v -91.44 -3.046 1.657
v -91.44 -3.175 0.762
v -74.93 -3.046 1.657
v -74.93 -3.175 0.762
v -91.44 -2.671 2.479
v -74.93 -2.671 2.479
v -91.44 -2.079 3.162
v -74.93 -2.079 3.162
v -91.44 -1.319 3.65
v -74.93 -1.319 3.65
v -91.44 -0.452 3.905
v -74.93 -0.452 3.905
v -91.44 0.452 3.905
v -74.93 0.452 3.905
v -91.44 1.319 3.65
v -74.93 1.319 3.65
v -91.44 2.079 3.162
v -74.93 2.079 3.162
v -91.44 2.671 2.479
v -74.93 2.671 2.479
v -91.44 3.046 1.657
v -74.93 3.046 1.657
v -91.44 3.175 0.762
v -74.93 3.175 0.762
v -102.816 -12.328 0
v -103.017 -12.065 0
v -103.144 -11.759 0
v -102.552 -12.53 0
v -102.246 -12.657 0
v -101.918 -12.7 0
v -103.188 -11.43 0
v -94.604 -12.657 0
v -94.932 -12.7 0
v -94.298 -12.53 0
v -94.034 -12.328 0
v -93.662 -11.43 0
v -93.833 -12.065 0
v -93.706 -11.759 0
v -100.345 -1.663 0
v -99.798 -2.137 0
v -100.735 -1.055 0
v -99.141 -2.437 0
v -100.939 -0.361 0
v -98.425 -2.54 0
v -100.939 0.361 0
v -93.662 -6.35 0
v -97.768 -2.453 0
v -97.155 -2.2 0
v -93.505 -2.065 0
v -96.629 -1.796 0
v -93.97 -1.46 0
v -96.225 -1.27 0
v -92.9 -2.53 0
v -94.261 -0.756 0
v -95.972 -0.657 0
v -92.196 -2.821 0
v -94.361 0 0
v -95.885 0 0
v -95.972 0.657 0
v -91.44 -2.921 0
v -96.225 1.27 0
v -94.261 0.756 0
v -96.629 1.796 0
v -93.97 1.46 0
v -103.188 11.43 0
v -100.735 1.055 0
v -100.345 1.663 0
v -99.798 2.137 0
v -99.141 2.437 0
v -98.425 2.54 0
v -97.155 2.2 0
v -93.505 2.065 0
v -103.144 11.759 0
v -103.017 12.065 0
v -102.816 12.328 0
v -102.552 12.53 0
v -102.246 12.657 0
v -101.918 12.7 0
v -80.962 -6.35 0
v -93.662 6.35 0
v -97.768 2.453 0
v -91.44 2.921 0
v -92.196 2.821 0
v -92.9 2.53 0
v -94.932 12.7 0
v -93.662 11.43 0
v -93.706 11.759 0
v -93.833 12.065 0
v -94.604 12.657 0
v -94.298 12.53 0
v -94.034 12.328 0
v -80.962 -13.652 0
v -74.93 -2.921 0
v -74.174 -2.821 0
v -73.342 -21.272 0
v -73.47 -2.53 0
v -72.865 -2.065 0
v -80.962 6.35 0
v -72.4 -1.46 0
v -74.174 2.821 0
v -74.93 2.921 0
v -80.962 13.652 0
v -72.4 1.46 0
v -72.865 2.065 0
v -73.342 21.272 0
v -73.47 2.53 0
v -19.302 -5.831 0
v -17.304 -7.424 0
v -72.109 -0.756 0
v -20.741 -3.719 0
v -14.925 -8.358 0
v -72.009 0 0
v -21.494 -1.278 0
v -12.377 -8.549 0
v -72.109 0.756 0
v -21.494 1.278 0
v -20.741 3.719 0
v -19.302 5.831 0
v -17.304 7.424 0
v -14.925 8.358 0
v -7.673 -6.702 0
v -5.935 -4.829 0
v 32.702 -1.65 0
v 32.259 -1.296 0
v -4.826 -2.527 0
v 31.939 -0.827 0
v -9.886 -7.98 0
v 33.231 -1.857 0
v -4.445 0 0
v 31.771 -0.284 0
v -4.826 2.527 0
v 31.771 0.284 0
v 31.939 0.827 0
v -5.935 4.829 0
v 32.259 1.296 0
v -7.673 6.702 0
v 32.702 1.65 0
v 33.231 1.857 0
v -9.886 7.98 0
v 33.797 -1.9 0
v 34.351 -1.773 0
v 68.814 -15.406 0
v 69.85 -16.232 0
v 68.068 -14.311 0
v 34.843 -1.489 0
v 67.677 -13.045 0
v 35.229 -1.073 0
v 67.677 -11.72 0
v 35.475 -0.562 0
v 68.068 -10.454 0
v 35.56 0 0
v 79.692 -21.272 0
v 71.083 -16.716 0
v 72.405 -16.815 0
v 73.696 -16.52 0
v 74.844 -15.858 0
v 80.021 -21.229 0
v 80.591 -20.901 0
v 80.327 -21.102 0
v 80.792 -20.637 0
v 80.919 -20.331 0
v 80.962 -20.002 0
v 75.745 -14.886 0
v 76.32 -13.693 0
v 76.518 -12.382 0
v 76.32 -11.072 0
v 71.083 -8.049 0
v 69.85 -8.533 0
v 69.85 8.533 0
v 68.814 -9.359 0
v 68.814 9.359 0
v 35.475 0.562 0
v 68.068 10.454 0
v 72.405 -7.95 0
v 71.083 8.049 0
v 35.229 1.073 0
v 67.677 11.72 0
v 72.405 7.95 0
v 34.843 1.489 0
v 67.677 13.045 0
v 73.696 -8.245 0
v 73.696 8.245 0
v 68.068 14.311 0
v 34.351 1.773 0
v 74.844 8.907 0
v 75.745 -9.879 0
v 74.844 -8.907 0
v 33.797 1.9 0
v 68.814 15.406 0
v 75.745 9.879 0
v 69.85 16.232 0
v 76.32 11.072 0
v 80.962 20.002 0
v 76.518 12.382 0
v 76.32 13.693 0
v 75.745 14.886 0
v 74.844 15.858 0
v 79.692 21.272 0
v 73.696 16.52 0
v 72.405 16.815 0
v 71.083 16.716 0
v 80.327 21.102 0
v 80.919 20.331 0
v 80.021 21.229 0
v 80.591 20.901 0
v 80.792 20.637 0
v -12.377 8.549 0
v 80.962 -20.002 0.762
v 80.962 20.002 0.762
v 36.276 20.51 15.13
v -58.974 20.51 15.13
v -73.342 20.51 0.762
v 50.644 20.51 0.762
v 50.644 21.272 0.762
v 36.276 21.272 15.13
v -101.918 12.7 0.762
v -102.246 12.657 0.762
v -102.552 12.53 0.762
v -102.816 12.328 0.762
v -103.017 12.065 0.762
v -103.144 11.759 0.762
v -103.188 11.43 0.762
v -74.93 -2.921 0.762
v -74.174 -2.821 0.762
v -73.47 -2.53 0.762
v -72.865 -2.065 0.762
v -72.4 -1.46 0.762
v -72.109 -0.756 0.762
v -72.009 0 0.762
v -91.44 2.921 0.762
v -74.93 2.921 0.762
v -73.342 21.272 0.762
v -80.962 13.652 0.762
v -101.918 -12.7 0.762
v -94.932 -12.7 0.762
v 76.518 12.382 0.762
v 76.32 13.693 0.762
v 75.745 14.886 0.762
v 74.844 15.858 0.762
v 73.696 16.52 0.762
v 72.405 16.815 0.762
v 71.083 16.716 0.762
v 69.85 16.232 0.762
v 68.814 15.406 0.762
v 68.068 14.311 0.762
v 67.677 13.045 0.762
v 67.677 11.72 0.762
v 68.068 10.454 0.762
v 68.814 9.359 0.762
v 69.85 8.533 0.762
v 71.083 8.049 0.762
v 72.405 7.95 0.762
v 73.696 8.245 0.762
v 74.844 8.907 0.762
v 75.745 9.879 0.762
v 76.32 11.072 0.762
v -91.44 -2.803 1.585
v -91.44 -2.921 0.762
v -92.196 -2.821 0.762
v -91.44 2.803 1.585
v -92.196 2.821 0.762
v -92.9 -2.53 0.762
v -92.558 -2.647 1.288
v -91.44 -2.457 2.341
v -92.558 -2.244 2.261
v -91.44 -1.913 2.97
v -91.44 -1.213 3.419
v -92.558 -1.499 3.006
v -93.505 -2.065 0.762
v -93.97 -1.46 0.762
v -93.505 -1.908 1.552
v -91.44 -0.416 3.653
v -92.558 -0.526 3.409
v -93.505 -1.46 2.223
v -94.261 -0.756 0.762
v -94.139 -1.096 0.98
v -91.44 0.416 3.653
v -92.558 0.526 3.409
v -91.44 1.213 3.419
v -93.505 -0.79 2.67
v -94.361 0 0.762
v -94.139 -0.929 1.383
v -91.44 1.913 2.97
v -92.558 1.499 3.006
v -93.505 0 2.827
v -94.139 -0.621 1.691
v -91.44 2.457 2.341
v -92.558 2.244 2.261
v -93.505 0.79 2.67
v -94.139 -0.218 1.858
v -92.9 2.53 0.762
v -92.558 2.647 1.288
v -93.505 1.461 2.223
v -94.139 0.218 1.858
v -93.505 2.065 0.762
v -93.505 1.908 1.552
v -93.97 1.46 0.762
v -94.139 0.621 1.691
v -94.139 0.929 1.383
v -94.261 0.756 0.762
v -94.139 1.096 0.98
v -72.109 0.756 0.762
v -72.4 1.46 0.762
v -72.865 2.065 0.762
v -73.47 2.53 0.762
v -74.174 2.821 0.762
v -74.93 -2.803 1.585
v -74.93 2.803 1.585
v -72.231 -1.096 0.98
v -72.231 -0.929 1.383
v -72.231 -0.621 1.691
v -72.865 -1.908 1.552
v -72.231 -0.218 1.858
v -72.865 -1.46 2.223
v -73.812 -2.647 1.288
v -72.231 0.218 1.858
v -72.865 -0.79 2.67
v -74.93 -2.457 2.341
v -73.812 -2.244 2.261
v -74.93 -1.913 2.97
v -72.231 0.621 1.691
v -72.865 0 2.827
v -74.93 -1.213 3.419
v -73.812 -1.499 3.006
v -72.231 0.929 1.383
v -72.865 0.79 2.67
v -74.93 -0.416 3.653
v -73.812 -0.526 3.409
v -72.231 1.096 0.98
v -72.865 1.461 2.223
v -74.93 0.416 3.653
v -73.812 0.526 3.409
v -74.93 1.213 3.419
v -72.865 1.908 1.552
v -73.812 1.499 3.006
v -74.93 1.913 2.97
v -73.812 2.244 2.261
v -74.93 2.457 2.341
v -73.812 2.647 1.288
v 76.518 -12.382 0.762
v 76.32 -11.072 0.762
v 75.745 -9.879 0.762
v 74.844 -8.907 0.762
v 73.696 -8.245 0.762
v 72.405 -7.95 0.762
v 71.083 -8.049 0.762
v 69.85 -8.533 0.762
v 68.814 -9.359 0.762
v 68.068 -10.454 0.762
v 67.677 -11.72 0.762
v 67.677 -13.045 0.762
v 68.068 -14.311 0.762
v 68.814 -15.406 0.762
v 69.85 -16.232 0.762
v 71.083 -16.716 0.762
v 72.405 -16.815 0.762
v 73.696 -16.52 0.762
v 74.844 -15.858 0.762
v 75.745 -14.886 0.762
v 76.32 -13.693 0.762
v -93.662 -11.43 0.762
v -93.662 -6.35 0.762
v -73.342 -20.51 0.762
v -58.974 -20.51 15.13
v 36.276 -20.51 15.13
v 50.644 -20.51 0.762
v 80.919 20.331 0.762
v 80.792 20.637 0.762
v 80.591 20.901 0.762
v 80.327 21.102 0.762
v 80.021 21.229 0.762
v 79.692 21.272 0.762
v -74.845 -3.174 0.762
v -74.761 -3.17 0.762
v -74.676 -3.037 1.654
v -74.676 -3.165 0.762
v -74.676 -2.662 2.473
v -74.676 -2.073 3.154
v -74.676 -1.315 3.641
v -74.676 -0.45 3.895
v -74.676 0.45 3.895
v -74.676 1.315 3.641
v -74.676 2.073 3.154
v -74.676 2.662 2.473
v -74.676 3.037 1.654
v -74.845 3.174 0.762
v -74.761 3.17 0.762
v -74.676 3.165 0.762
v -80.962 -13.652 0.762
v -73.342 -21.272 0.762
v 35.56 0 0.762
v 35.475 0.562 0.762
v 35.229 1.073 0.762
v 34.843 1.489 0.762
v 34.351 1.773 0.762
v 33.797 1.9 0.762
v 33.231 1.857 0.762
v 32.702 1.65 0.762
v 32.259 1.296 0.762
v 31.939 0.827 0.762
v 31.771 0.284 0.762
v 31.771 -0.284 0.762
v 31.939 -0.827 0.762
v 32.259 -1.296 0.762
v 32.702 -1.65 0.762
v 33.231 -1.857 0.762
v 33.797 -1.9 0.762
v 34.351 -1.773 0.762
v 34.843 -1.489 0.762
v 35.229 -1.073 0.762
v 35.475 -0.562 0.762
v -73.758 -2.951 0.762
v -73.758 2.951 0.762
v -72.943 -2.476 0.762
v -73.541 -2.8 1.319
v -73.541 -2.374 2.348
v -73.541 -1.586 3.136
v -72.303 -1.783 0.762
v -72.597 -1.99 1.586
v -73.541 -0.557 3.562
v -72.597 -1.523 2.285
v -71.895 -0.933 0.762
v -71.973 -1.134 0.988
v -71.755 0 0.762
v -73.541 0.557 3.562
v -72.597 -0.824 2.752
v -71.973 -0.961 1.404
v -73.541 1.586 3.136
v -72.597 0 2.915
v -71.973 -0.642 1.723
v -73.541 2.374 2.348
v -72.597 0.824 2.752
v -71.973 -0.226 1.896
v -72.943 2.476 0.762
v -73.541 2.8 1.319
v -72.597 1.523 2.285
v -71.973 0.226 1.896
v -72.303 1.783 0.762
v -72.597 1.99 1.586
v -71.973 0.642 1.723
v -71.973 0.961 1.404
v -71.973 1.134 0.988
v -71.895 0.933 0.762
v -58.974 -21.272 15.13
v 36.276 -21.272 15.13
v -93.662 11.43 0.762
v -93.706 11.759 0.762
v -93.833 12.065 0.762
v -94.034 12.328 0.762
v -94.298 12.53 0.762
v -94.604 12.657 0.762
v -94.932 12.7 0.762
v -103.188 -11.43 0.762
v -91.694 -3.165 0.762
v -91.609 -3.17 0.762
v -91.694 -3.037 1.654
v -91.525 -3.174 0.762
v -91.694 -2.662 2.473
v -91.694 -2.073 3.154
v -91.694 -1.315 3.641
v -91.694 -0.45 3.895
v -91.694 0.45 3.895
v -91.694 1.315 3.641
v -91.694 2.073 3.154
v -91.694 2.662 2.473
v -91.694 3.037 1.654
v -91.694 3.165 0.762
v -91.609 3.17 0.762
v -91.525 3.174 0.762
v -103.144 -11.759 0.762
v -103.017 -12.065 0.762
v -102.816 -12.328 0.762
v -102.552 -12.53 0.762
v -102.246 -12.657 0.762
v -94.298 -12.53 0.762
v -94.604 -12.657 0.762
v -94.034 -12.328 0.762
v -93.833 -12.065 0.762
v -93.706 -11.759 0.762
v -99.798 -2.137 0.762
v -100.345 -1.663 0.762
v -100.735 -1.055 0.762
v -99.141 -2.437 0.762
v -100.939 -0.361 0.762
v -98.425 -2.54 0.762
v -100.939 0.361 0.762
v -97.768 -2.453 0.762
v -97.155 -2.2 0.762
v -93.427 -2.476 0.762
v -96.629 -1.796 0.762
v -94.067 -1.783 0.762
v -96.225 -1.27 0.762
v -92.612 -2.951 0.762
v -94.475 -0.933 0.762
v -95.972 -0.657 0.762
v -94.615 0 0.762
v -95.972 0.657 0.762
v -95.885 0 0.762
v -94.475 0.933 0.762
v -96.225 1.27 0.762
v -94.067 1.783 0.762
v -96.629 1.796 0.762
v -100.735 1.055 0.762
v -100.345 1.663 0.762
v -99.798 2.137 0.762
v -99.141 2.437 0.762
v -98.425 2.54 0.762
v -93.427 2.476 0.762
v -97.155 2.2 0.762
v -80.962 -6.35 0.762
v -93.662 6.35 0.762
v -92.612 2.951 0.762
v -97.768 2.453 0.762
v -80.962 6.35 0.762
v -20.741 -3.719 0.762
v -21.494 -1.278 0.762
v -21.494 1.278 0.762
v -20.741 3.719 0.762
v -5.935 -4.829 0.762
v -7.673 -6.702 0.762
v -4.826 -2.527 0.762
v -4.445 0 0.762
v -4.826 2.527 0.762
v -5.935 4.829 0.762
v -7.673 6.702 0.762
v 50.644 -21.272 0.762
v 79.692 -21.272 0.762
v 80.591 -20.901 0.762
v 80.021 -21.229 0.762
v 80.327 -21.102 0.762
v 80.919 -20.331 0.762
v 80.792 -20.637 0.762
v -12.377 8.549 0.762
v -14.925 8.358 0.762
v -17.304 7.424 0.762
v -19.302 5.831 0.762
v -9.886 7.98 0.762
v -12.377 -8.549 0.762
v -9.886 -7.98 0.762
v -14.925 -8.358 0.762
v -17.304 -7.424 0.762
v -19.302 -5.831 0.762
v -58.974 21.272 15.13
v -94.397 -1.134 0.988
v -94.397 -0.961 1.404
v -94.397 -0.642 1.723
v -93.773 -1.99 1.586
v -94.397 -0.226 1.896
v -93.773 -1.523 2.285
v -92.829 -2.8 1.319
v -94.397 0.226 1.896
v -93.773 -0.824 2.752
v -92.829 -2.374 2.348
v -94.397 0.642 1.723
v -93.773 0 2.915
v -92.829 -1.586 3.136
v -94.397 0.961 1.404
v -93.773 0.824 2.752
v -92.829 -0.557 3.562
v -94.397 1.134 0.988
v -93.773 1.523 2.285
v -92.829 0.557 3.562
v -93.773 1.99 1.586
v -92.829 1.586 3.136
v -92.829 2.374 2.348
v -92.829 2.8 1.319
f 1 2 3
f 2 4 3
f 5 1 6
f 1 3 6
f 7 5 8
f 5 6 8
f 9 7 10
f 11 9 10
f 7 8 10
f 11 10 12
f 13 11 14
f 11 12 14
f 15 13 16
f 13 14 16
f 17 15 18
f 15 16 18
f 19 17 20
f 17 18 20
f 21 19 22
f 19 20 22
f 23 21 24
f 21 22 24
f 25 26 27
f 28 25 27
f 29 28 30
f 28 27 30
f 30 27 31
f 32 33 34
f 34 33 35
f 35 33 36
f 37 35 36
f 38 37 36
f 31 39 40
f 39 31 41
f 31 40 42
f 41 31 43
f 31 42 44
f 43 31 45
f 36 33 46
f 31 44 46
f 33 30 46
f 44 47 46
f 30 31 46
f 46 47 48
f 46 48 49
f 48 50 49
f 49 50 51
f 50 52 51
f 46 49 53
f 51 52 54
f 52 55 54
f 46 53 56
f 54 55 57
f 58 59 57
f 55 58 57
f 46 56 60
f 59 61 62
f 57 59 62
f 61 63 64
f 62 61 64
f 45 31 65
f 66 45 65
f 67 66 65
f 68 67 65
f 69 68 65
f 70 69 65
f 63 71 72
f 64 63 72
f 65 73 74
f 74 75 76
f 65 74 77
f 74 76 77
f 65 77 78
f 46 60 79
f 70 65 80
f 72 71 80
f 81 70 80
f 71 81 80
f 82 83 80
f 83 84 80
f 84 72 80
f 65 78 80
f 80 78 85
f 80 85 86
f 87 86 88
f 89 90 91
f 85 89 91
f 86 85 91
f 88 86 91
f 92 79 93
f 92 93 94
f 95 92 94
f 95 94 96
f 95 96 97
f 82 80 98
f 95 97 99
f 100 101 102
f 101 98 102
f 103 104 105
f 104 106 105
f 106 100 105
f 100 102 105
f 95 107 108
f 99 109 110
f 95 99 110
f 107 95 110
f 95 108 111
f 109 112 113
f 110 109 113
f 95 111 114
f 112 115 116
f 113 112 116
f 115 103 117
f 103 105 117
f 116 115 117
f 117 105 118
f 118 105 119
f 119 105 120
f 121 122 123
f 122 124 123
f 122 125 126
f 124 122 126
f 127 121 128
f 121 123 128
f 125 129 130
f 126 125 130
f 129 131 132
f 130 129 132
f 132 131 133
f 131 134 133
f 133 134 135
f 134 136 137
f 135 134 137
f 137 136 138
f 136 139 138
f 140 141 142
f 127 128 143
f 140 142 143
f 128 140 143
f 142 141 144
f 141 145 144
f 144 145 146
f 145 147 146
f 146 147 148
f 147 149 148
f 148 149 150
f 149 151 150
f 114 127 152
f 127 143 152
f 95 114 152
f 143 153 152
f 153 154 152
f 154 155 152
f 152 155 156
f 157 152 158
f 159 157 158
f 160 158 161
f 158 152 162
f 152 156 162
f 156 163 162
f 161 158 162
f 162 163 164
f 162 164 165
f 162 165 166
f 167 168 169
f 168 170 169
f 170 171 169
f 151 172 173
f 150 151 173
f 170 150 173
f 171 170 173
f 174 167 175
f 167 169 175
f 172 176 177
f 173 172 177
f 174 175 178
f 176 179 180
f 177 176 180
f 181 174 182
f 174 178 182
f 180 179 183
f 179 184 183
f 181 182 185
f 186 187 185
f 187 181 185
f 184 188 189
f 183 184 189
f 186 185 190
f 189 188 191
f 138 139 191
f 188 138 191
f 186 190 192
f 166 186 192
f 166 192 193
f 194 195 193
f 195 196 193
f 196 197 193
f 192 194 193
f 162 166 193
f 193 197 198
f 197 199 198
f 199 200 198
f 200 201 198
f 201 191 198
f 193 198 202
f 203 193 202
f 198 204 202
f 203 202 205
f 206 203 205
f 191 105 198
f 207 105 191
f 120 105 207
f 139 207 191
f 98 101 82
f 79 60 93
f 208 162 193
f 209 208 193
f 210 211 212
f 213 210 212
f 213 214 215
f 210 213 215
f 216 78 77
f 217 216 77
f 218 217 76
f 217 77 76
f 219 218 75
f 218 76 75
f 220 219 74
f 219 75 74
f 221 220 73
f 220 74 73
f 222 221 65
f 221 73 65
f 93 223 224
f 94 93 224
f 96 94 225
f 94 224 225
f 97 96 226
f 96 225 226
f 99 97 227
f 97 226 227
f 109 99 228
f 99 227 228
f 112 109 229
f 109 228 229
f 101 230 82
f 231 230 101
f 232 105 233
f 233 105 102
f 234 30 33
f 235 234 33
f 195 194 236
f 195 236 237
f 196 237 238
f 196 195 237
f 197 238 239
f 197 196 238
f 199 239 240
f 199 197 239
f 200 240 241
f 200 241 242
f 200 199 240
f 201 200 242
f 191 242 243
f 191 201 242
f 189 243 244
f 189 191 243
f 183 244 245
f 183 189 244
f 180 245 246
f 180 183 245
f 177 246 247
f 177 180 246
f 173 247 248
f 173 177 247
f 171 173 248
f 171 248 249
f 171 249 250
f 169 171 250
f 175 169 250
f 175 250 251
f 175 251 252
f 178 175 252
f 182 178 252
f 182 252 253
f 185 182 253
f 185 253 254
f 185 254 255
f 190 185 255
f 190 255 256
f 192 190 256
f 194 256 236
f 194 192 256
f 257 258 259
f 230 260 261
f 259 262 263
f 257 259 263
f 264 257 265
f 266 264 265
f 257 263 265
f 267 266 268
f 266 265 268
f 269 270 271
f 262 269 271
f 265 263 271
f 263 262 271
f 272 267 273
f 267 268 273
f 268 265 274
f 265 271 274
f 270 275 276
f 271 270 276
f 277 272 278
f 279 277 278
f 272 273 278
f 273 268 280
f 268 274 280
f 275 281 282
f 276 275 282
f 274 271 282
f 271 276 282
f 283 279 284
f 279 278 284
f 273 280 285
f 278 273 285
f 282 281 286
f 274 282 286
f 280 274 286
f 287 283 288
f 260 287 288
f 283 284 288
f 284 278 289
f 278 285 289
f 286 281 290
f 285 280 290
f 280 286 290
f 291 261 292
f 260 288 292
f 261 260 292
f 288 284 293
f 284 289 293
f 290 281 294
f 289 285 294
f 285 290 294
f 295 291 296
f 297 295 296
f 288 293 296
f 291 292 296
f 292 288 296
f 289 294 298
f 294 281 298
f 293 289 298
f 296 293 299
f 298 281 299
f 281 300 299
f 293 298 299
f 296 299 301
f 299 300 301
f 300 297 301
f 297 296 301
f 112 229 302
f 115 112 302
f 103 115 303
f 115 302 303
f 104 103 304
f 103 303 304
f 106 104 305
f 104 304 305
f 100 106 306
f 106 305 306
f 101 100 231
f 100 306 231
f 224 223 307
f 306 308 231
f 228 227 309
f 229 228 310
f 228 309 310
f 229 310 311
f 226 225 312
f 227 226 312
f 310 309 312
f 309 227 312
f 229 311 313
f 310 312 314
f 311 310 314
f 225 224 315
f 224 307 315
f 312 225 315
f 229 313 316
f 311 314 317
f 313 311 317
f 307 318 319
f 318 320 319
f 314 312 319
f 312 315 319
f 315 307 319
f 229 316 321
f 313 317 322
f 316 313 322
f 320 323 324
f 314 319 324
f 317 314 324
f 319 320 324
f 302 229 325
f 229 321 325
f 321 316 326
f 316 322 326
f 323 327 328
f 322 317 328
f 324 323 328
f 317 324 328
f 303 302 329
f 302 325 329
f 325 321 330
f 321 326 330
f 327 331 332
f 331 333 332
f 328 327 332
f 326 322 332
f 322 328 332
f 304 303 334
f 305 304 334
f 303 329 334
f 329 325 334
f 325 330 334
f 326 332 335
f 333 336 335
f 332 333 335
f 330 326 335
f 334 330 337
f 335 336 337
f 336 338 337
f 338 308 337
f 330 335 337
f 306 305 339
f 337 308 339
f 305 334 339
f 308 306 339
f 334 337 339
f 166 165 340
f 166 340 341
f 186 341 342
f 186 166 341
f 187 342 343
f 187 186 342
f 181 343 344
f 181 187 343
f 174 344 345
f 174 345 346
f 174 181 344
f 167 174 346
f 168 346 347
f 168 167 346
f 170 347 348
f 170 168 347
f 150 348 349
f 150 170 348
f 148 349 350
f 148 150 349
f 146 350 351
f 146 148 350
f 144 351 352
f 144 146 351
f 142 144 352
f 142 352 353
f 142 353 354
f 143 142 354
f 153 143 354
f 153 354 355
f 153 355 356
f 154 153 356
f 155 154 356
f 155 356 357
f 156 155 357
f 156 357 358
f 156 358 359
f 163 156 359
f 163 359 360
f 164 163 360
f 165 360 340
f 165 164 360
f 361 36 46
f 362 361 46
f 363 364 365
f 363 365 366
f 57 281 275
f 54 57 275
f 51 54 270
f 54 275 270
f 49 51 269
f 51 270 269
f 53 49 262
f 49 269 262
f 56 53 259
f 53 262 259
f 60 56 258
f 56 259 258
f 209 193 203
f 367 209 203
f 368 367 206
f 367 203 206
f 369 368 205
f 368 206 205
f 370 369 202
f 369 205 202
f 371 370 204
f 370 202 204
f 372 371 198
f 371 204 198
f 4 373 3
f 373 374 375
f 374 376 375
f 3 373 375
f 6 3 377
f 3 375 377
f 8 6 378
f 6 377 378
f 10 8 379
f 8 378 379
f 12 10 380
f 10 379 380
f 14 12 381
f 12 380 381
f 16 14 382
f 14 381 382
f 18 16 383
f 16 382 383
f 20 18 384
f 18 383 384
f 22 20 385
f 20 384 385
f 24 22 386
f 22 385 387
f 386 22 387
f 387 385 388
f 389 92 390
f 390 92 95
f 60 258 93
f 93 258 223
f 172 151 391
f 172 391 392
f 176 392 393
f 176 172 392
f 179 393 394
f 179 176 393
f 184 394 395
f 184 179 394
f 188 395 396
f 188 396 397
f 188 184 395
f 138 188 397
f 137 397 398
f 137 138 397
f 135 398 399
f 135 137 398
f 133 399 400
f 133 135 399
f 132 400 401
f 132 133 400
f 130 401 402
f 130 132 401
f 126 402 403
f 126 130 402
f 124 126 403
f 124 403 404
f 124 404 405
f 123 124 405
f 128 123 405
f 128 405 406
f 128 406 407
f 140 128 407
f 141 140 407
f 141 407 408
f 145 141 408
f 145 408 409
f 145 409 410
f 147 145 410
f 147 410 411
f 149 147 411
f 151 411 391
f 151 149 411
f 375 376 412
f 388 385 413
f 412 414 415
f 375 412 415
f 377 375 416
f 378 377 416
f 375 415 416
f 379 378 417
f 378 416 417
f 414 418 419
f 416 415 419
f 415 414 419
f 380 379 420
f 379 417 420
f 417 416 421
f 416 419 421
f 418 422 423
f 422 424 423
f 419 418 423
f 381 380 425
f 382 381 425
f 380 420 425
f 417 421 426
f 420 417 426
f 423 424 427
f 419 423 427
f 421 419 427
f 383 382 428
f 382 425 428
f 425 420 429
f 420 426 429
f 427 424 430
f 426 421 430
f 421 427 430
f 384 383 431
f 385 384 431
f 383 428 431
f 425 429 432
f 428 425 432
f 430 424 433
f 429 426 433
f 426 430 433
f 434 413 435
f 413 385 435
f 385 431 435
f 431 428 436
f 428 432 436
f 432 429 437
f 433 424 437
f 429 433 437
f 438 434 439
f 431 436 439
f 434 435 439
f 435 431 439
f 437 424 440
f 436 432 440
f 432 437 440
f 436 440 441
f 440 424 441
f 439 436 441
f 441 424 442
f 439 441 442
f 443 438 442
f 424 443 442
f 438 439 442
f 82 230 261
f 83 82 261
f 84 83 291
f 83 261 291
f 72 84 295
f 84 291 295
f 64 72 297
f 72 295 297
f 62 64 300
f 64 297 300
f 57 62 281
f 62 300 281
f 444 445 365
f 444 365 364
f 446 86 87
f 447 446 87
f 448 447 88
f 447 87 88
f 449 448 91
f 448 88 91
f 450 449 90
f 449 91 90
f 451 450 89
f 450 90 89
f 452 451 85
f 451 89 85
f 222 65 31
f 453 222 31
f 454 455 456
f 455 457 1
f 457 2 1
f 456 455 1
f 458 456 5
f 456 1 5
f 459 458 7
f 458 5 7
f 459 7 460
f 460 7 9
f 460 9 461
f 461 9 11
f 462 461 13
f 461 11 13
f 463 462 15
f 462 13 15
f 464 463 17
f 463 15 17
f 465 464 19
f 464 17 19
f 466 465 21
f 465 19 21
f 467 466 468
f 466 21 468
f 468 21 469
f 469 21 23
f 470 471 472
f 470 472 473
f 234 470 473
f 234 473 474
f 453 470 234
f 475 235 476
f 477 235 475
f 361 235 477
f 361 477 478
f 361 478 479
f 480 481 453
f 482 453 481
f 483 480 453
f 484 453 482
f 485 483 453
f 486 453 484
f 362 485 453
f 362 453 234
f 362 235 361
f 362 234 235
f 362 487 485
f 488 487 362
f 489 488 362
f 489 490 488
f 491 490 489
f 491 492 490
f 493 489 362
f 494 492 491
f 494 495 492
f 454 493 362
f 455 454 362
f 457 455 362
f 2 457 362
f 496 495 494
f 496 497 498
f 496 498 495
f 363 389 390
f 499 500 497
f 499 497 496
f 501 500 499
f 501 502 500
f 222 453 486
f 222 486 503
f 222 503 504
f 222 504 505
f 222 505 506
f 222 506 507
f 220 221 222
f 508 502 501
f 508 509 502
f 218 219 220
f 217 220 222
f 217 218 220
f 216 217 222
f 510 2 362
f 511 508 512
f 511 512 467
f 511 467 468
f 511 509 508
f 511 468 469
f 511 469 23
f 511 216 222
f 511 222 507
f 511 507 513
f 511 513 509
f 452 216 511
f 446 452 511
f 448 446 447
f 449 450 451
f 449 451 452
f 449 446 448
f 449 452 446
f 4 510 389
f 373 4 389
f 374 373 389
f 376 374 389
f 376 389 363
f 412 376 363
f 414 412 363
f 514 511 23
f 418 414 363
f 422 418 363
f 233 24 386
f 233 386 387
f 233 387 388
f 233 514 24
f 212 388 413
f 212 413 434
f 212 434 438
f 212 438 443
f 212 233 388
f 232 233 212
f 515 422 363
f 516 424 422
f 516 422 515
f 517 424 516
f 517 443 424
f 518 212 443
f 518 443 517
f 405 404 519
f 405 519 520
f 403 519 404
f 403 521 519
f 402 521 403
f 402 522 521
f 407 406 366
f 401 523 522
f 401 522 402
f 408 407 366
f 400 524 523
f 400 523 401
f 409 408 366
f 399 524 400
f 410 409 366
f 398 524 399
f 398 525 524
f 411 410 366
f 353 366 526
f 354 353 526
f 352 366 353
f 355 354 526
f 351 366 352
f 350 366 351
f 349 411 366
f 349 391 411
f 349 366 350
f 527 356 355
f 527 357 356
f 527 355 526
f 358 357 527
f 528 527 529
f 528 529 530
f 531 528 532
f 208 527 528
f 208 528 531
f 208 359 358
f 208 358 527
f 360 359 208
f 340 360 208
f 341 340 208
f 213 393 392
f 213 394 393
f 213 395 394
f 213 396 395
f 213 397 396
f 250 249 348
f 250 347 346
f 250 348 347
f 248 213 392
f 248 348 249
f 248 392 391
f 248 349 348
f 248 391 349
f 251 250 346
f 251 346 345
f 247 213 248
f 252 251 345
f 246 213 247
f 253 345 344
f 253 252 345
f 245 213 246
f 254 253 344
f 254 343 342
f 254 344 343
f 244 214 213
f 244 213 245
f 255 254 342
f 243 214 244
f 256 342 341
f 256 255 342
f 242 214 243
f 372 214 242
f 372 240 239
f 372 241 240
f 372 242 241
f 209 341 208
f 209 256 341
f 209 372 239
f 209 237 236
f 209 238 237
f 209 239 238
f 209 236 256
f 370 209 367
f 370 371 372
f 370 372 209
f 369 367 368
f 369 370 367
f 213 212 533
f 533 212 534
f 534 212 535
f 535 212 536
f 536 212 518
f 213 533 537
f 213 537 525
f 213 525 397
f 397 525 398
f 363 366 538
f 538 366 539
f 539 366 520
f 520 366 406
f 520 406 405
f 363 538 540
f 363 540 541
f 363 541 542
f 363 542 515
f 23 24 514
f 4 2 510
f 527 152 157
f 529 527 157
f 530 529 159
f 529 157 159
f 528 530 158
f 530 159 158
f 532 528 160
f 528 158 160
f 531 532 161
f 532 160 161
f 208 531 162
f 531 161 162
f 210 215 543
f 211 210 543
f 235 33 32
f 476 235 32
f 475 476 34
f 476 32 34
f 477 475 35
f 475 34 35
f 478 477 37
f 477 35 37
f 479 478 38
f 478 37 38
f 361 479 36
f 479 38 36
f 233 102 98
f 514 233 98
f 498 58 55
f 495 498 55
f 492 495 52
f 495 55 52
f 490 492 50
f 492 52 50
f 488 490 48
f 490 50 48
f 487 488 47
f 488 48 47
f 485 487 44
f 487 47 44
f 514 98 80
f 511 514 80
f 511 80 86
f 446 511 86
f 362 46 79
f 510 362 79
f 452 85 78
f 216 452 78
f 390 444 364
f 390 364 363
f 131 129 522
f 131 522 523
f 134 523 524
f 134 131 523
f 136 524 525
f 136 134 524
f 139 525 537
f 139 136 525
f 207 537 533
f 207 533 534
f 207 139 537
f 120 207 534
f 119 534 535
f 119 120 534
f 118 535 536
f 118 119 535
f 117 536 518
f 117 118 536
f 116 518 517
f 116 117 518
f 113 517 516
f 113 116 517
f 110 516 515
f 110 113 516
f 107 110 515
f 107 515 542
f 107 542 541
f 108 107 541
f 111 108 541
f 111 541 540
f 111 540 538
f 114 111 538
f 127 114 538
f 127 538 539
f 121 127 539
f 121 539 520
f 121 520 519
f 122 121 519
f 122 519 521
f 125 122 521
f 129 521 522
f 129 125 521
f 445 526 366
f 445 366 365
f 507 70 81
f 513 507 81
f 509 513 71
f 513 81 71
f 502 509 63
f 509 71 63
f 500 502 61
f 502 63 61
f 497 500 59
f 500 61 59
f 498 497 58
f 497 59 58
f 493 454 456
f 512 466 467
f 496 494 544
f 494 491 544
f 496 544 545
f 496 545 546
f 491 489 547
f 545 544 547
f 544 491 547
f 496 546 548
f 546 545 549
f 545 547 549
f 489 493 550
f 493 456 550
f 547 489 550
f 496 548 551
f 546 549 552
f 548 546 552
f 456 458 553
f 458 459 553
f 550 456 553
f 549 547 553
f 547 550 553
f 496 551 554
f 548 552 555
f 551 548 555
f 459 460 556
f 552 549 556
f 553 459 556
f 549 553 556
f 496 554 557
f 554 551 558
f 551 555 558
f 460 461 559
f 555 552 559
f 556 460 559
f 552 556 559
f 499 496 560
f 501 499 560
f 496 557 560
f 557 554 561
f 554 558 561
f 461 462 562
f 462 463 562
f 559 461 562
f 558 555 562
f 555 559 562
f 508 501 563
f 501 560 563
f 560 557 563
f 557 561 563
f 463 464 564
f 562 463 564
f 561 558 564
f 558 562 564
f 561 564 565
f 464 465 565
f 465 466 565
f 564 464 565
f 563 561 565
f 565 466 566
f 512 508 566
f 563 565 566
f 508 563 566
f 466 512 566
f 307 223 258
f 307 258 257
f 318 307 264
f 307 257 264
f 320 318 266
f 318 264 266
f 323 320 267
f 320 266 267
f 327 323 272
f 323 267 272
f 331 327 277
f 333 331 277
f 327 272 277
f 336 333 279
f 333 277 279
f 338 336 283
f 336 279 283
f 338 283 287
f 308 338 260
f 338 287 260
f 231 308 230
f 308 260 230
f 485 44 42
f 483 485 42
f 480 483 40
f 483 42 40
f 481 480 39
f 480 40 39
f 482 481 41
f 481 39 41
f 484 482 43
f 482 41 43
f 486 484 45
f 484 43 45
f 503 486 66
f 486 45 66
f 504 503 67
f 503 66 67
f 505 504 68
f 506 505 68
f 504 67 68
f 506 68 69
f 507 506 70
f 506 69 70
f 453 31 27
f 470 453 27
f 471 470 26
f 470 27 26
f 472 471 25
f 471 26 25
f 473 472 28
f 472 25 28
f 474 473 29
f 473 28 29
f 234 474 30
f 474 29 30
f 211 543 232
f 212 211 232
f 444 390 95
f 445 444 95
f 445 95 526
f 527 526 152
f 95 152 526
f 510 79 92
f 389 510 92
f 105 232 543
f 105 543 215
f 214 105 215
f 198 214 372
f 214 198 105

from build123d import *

# Parameters (mm, degrees)
F0_R     = 4.445
F0_R_2   = 8.5725
F0_R_3   = 1.905
F0_W     = 17.4625
F0_H     = 12.7
F0_W_2   = 12.7
F1_DEPTH = 0.762
F3_DEPTH = 0.762
F4_W     = 16.51
F4_H     = 2.921
F5_DEPTH = 25.4
F6_ANGLE = 180


# Not quite as in the source:
# - a pattern or mirror of a feature is missing from the dataset's text; its kind, count and spacing are read off the source's solid


with BuildPart() as f1:
    # F0 (on Top) → F1 (new body)
    with BuildSketch(Plane.XY):
        with BuildLine():
            Line((79.6925, 21.2725), (-73.3425, 21.2725))
            Line((-73.3425, 21.2725), (-80.9625, 13.6525))
            Line((-80.9625, 13.6525), (-80.9625, 6.35))
            Line((-80.9625, 6.35), (-63.5, 6.35))
            Line((-63.5, 6.35), (-63.5, -6.35))
            Line((-63.5, -6.35), (-80.9625, -6.35))
            Line((-80.9625, -6.35), (-80.9625, -13.6525))
            Line((-80.9625, -13.6525), (-73.3425, -21.2725))
            Line((-73.3425, -21.2725), (79.6925, -21.2725))
            ThreePointArc((79.6925, -21.2725), (80.5905256121, -20.9005256121), (80.9625, -20.0025))
            Line((80.9625, -20.0025), (80.9625, 20.0025))
            ThreePointArc((80.9625, 20.0025), (80.5905256121, 20.9005256121), (79.6925, 21.2725))
        make_face()
        with Locations((72.0725, -12.3825)):
            Circle(F0_R, mode=Mode.SUBTRACT)
        with Locations((-13.0175, 0)):
            Circle(F0_R_2, mode=Mode.SUBTRACT)
        with Locations((33.655, 0)):
            Circle(F0_R_3, mode=Mode.SUBTRACT)
        with Locations((72.0725, 12.3825)):
            Circle(F0_R, mode=Mode.SUBTRACT)
        with Locations((-72.23125, 0)):
            Rectangle(F0_W, F0_H)
        with Locations((-87.3125, 0)):
            Rectangle(F0_W_2, F0_H)
        with BuildLine():
            Line((-93.6625, -6.35), (-93.6625, 6.35))
            Line((-93.6625, 6.35), (-98.425, 6.35))
            Line((-98.425, 6.35), (-98.425, 2.54))
            ThreePointArc((-98.425, 2.54), (-96.6289487758, 1.7960512242), (-95.885, 0))
            ThreePointArc((-95.885, 0), (-96.6289487758, -1.7960512242), (-98.425, -2.54))
            Line((-98.425, -2.54), (-98.425, -6.35))
            Line((-98.425, -6.35), (-93.6625, -6.35))
        make_face()
        with BuildLine():
            Line((-98.425, 6.35), (-93.6625, 6.35))
            Line((-93.6625, 6.35), (-93.6625, 11.43))
            ThreePointArc((-93.6625, 11.43), (-94.0344743879, 12.3280256121), (-94.9325, 12.7))
            Line((-94.9325, 12.7), (-101.9175, 12.7))
            ThreePointArc((-101.9175, 12.7), (-102.8155256121, 12.3280256121), (-103.1875, 11.43))
            Line((-103.1875, 11.43), (-103.1875, -11.43))
            ThreePointArc((-103.1875, -11.43), (-102.8155256121, -12.3280256121), (-101.9175, -12.7))
            Line((-101.9175, -12.7), (-94.9325, -12.7))
            ThreePointArc((-94.9325, -12.7), (-94.0344743879, -12.3280256121), (-93.6625, -11.43))
            Line((-93.6625, -11.43), (-93.6625, -6.35))
            Line((-93.6625, -6.35), (-98.425, -6.35))
            Line((-98.425, -6.35), (-98.425, -2.54))
            ThreePointArc((-98.425, -2.54), (-100.965, 0), (-98.425, 2.54))
            Line((-98.425, 2.54), (-98.425, 6.35))
        make_face()
    extrude(amount=F1_DEPTH)

    # F2 (on face) → F3 (join)
    with BuildSketch(Plane.XZ.offset(21.2725)):
        Polygon((-58.9740902063, 15.1304097937), (-73.3425, 0.762), (50.6443195874, 0.762), (36.2759097937, 15.1304097937), align=None)
    f3 = extrude(amount=-F3_DEPTH)

    # F3_copies: F3 across plane
    add(f3.mirror(Plane.ZX))

    # F4 (on face) → F5 (cut)
    with BuildSketch(Plane.XY.offset(0.762)):
        with BuildLine():
            Line((-91.44, 0), (-91.44, 2.921))
            ThreePointArc((-91.44, 2.921), (-93.5054589078, 2.0654589078), (-94.361, 0))
            Line((-94.361, 0), (-91.44, 0))
        make_face()
        with BuildLine():
            Line((-91.44, -2.921), (-91.44, 0))
            Line((-91.44, 0), (-94.361, 0))
            ThreePointArc((-94.361, 0), (-93.5054589078, -2.0654589078), (-91.44, -2.921))
        make_face()
        with Locations((-83.185, 1.4605)):
            Rectangle(F4_W, F4_H)
        with BuildLine():
            Line((-72.009, 0), (-74.93, 0))
            Line((-74.93, 0), (-74.93, -2.921))
            ThreePointArc((-74.93, -2.921), (-72.8645410922, -2.0654589078), (-72.009, 0))
        make_face()
        with BuildLine():
            ThreePointArc((-72.009, 0), (-72.8645410922, 2.0654589078), (-74.93, 2.921))
            Line((-74.93, 2.921), (-74.93, 0))
            Line((-74.93, 0), (-72.009, 0))
        make_face()
        with Locations((-83.185, -1.4605)):
            Rectangle(F4_W, F4_H)
    extrude(amount=-F5_DEPTH, mode=Mode.SUBTRACT)

    # F4 (on face) → F6 (revolve)
    with BuildSketch(Plane.XY.offset(0.762)):
        with BuildLine():
            Line((-71.755, 0), (-72.009, 0))
            ThreePointArc((-72.009, 0), (-72.8645410922, -2.0654589078), (-74.93, -2.921))
            ThreePointArc((-74.93, -2.921), (-74.754023638, -2.9918379952), (-74.6762032813, -3.16484))
            ThreePointArc((-74.6762032813, -3.16484), (-72.5969301787, -2.1534646988), (-71.755, 0))
        make_face()
        with BuildLine():
            ThreePointArc((-74.6762032813, -3.16484), (-74.754023638, -2.9918379952), (-74.93, -2.921))
            Line((-74.93, -2.921), (-74.93, -3.175))
            ThreePointArc((-74.93, -3.175), (-74.803, -3.1724589832), (-74.6762032813, -3.16484))
        make_face()
        with BuildLine():
            Line((-74.93, -3.175), (-74.93, -2.921))
            ThreePointArc((-74.93, -2.921), (-75.1096051224, -2.9953948776), (-75.184, -3.175))
            Line((-75.184, -3.175), (-74.93, -3.175))
        make_face()
        with BuildLine():
            Line((-74.93, -2.921), (-91.44, -2.921))
            ThreePointArc((-91.44, -2.921), (-91.2603948776, -2.9953948776), (-91.186, -3.175))
            Line((-91.186, -3.175), (-75.184, -3.175))
            ThreePointArc((-75.184, -3.175), (-75.1096051224, -2.9953948776), (-74.93, -2.921))
        make_face()
        with BuildLine():
            ThreePointArc((-91.186, -3.175), (-91.2603948776, -2.9953948776), (-91.44, -2.921))
            Line((-91.44, -2.921), (-91.44, -3.175))
            Line((-91.44, -3.175), (-91.186, -3.175))
        make_face()
        with BuildLine():
            Line((-91.44, -3.175), (-91.44, -2.921))
            ThreePointArc((-91.44, -2.921), (-91.615976362, -2.9918379952), (-91.6937967187, -3.16484))
            ThreePointArc((-91.6937967187, -3.16484), (-91.567, -3.1724589832), (-91.44, -3.175))
        make_face()
        with BuildLine():
            ThreePointArc((-91.44, -2.921), (-93.5054589078, -2.0654589078), (-94.361, 0))
            Line((-94.361, 0), (-94.615, 0))
            ThreePointArc((-94.615, 0), (-93.7730698213, -2.1534646988), (-91.6937967187, -3.16484))
            ThreePointArc((-91.6937967187, -3.16484), (-91.615976362, -2.9918379952), (-91.44, -2.921))
        make_face()
    revolve(axis=Axis((-83.185, 0, 0.762), (-1, 0, 0)), revolution_arc=F6_ANGLE)


solid = f1.part
